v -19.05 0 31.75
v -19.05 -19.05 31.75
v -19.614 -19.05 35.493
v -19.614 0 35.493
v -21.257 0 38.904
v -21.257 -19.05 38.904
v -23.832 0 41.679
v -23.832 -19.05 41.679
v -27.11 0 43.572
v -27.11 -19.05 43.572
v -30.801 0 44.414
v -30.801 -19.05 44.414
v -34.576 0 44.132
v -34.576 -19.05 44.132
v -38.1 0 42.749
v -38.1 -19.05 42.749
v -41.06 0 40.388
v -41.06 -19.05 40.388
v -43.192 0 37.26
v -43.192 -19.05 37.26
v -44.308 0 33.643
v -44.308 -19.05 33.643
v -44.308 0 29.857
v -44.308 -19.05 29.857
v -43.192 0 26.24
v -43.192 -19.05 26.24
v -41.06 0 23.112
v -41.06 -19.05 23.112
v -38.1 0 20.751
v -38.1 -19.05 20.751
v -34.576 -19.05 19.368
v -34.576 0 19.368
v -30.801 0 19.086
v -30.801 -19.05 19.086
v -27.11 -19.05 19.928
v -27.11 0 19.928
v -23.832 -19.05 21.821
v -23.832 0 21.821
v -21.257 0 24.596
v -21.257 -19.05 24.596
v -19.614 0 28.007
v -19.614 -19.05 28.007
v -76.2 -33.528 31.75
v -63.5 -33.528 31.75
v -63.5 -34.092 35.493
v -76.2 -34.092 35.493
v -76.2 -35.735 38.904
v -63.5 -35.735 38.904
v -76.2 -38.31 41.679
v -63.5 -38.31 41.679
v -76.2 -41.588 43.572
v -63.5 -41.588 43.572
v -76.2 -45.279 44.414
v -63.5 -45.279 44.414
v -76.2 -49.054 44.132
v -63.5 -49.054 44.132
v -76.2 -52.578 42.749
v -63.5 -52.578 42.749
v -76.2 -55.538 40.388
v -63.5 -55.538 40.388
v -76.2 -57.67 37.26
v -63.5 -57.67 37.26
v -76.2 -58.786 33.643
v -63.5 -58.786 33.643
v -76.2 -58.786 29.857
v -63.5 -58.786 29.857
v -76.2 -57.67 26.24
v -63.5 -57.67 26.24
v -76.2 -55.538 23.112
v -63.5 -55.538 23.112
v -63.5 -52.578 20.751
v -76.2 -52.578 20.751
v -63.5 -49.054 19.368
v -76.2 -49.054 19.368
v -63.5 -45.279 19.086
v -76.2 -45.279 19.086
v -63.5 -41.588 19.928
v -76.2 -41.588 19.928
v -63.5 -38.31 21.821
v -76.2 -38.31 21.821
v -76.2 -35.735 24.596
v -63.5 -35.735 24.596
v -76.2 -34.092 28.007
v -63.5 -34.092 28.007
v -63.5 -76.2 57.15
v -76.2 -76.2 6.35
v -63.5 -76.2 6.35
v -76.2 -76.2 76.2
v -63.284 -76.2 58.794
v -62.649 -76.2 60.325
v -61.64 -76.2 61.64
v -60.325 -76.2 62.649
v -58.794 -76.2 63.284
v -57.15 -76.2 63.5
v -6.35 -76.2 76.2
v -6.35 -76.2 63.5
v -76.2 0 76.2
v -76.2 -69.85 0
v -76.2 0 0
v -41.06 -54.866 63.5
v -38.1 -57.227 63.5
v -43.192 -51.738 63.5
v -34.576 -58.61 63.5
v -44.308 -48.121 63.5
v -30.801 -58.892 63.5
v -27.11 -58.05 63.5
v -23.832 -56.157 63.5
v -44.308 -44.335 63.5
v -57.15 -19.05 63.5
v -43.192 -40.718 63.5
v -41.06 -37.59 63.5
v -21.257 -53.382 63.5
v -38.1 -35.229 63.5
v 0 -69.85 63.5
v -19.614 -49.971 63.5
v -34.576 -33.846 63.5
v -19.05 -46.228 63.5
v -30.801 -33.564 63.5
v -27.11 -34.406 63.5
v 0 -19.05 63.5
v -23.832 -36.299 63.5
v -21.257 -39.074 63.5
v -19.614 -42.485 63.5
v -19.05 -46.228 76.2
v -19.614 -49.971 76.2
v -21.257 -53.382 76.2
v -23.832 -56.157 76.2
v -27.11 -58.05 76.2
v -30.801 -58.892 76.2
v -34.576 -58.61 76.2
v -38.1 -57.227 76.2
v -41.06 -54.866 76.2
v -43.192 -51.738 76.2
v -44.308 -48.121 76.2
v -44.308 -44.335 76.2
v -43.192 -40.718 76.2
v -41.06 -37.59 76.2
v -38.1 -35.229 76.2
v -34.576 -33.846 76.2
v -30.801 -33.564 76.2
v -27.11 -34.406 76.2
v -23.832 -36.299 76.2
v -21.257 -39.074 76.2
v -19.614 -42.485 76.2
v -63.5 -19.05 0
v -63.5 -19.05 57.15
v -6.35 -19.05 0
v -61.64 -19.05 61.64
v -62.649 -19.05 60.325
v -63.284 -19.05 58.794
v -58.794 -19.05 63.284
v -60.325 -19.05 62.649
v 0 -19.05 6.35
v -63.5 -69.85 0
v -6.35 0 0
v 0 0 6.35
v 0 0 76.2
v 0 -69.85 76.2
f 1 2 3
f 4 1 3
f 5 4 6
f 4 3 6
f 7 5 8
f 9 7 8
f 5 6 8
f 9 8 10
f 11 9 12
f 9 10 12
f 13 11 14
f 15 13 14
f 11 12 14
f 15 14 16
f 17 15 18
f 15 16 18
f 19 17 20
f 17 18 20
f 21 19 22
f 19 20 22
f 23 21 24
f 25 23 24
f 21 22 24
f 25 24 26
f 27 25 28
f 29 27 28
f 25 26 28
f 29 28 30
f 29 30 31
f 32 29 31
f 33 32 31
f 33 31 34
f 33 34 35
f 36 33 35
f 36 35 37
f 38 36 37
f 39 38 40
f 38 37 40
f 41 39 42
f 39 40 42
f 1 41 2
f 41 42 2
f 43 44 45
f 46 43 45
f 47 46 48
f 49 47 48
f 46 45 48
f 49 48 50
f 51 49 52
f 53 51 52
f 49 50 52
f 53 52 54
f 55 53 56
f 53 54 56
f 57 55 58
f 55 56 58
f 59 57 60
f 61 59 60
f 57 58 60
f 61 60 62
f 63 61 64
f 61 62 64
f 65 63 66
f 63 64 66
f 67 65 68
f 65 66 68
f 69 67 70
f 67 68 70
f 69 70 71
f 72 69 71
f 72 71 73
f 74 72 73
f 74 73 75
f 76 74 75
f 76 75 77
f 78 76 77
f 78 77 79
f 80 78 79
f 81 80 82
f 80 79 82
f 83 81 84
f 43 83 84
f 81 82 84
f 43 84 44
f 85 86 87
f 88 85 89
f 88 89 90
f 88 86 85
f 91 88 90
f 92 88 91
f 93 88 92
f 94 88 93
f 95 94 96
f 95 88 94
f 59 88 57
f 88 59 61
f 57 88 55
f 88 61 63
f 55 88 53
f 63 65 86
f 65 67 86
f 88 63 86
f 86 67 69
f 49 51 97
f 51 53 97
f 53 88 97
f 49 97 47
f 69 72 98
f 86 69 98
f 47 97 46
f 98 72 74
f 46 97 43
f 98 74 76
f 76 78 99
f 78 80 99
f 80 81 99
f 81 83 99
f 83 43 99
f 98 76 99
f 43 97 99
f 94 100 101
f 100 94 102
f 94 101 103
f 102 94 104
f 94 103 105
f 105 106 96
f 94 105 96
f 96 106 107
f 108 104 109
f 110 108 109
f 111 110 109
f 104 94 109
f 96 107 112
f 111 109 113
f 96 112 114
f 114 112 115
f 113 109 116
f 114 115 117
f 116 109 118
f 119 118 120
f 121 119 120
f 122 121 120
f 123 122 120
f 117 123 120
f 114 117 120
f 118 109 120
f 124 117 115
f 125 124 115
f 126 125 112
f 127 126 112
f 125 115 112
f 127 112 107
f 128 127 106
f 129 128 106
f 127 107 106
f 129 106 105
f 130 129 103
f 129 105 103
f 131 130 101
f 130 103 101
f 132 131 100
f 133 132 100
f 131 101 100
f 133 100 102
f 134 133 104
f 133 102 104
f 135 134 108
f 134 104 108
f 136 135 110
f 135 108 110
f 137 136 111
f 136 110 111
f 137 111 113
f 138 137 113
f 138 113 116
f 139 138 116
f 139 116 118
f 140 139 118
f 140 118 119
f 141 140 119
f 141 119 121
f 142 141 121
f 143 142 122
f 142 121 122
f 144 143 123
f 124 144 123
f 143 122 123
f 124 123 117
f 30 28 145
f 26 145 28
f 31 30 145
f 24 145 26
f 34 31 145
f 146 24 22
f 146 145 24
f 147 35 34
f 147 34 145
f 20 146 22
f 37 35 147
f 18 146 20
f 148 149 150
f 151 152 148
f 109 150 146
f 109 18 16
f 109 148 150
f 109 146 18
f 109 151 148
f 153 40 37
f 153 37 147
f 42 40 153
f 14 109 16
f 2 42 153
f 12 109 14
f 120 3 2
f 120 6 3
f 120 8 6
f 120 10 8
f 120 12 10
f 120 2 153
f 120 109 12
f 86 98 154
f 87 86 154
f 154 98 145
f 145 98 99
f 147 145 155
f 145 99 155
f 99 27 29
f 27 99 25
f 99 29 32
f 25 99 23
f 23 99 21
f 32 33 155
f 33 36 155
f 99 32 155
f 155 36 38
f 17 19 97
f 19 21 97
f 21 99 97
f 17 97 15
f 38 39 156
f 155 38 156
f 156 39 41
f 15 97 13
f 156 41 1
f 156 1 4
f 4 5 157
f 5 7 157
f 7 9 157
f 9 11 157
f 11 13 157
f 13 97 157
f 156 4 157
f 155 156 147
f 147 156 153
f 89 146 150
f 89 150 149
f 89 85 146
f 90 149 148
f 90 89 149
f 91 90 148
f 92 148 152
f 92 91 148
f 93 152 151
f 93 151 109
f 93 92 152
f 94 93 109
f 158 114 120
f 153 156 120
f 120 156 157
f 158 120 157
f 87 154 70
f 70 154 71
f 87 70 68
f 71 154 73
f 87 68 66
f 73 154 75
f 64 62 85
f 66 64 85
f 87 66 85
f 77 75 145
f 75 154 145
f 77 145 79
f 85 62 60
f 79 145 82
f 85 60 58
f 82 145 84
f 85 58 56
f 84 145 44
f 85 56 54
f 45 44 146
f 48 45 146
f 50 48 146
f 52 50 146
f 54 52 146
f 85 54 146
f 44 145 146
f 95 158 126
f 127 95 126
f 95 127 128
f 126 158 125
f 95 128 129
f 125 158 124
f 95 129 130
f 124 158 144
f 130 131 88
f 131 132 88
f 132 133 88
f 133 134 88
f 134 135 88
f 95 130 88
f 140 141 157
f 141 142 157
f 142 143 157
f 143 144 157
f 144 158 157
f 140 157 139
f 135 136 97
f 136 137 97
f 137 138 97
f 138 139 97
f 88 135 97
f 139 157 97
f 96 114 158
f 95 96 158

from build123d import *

# Parameters (mm, degrees)
F0_W      = 76.2
F0_H      = 76.2
F1_DEPTH  = 19.05
F3_DEPTH  = 57.15
F4_R      = 12.7
F5_DEPTH  = 12.7
F6_R      = 12.7
F7_DEPTH  = 19.05
F8_R      = 6.35
F9_SIZE   = 6.35
F10_R     = 12.7
F11_DEPTH = 12.7


with BuildPart() as f1:
    # F0 (on Front) → F1 (new body)
    with BuildSketch(Plane.XZ):
        with Locations((-38.1, 38.1)):
            Rectangle(F0_W, F0_H)
    extrude(amount=F1_DEPTH)

    # F2 (on face) → F3 (join)
    with BuildSketch(Plane.XZ.offset(19.05)):
        Polygon((-76.2, 76.2), (-76.2, 0), (-63.5, 0), (-63.5, 63.5), (0, 63.5), (0, 76.2), align=None)
    extrude(amount=F3_DEPTH)

    # F4 (on face) → F5 (cut)
    with BuildSketch(Plane(origin=(0, 0, 63.5), x_dir=(1, 0, 0), z_dir=(0, 0, -1))):
        with Locations((-31.75, 46.228)):
            Circle(F4_R)
    extrude(amount=-F5_DEPTH, mode=Mode.SUBTRACT)

    # F6 (on face) → F7 (cut)
    with BuildSketch(Plane.XZ.offset(19.05)):
        with Locations((-31.75, 31.75)):
            Circle(F6_R)
    extrude(amount=-F7_DEPTH, mode=Mode.SUBTRACT)

    # F8
    f8_edges = [f1.edges().sort_by_distance(p)[0] for p in [
        (-63.5, -47.625, 63.5),
    ]]
    fillet(f8_edges, radius=F8_R)

    # F9
    f9_edges = [f1.edges().sort_by_distance(p)[0] for p in [
        (0, -9.525, 0),
        (-69.85, -76.2, 0),
        (0, -76.2, 69.85),
    ]]
    chamfer(f9_edges, length=F9_SIZE)

    # F10 (on face) → F11 (cut)
    with BuildSketch(Plane.YZ.offset(-63.5)):
        with Locations((-46.228, 31.75)):
            Circle(F10_R)
    extrude(amount=-F11_DEPTH, mode=Mode.SUBTRACT)


solid = f1.part
